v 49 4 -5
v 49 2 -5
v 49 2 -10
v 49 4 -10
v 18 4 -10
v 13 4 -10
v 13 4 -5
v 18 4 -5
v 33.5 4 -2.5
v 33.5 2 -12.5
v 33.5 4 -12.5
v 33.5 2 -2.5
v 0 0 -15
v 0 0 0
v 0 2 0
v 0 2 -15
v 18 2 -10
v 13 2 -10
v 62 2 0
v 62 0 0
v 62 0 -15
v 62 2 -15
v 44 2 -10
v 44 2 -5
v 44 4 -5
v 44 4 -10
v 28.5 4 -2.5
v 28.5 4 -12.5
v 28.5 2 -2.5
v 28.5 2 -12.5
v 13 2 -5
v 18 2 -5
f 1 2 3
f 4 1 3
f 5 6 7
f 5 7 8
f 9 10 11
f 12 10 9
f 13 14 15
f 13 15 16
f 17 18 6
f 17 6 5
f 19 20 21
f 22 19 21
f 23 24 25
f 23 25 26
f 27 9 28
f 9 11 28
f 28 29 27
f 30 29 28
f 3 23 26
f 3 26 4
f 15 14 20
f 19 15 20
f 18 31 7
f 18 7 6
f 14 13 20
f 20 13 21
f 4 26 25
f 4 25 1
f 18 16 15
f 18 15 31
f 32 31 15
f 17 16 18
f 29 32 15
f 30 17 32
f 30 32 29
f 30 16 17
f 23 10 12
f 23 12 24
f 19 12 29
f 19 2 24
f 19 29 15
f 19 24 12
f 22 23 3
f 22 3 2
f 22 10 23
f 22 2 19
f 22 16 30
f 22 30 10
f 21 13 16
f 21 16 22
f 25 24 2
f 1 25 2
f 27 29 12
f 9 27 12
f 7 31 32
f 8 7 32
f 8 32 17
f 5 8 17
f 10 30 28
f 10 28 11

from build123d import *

# Parameters (mm, degrees)
SKETCH1_W           = 62
SKETCH1_H           = 15
BOSS_EXTRUDE1_DEPTH = 2
SKETCH2_W           = 5
SKETCH2_H           = 5
BOSS_EXTRUDE2_DEPTH = 2


with BuildPart() as part:
    # Sketch1 → Boss-Extrude1 (new body)
    with BuildSketch(Plane(origin=(0, 0, 0), x_dir=(1, 0, 0), z_dir=(0, 1, 0))):
        with Locations((31, 7.5)):
            Rectangle(SKETCH1_W, SKETCH1_H)
    extrude(amount=BOSS_EXTRUDE1_DEPTH)

    # Sketch2 → Boss-Extrude2 (add)
    with BuildSketch(Plane(origin=(0, 2, 0), x_dir=(1, 0, 0), z_dir=(0, 1, 0))):
        with Locations((15.5, 7.5)):
            Rectangle(SKETCH2_W, SKETCH2_H)
        with Locations((46.5, 7.5)):
            Rectangle(SKETCH2_W, SKETCH2_H)
        Polygon((31, 2.5), (28.5, 2.5), (28.5, 12.5), (33.5, 12.5), (33.5, 2.5), align=None)
    extrude(amount=BOSS_EXTRUDE2_DEPTH)


solid = part.part
